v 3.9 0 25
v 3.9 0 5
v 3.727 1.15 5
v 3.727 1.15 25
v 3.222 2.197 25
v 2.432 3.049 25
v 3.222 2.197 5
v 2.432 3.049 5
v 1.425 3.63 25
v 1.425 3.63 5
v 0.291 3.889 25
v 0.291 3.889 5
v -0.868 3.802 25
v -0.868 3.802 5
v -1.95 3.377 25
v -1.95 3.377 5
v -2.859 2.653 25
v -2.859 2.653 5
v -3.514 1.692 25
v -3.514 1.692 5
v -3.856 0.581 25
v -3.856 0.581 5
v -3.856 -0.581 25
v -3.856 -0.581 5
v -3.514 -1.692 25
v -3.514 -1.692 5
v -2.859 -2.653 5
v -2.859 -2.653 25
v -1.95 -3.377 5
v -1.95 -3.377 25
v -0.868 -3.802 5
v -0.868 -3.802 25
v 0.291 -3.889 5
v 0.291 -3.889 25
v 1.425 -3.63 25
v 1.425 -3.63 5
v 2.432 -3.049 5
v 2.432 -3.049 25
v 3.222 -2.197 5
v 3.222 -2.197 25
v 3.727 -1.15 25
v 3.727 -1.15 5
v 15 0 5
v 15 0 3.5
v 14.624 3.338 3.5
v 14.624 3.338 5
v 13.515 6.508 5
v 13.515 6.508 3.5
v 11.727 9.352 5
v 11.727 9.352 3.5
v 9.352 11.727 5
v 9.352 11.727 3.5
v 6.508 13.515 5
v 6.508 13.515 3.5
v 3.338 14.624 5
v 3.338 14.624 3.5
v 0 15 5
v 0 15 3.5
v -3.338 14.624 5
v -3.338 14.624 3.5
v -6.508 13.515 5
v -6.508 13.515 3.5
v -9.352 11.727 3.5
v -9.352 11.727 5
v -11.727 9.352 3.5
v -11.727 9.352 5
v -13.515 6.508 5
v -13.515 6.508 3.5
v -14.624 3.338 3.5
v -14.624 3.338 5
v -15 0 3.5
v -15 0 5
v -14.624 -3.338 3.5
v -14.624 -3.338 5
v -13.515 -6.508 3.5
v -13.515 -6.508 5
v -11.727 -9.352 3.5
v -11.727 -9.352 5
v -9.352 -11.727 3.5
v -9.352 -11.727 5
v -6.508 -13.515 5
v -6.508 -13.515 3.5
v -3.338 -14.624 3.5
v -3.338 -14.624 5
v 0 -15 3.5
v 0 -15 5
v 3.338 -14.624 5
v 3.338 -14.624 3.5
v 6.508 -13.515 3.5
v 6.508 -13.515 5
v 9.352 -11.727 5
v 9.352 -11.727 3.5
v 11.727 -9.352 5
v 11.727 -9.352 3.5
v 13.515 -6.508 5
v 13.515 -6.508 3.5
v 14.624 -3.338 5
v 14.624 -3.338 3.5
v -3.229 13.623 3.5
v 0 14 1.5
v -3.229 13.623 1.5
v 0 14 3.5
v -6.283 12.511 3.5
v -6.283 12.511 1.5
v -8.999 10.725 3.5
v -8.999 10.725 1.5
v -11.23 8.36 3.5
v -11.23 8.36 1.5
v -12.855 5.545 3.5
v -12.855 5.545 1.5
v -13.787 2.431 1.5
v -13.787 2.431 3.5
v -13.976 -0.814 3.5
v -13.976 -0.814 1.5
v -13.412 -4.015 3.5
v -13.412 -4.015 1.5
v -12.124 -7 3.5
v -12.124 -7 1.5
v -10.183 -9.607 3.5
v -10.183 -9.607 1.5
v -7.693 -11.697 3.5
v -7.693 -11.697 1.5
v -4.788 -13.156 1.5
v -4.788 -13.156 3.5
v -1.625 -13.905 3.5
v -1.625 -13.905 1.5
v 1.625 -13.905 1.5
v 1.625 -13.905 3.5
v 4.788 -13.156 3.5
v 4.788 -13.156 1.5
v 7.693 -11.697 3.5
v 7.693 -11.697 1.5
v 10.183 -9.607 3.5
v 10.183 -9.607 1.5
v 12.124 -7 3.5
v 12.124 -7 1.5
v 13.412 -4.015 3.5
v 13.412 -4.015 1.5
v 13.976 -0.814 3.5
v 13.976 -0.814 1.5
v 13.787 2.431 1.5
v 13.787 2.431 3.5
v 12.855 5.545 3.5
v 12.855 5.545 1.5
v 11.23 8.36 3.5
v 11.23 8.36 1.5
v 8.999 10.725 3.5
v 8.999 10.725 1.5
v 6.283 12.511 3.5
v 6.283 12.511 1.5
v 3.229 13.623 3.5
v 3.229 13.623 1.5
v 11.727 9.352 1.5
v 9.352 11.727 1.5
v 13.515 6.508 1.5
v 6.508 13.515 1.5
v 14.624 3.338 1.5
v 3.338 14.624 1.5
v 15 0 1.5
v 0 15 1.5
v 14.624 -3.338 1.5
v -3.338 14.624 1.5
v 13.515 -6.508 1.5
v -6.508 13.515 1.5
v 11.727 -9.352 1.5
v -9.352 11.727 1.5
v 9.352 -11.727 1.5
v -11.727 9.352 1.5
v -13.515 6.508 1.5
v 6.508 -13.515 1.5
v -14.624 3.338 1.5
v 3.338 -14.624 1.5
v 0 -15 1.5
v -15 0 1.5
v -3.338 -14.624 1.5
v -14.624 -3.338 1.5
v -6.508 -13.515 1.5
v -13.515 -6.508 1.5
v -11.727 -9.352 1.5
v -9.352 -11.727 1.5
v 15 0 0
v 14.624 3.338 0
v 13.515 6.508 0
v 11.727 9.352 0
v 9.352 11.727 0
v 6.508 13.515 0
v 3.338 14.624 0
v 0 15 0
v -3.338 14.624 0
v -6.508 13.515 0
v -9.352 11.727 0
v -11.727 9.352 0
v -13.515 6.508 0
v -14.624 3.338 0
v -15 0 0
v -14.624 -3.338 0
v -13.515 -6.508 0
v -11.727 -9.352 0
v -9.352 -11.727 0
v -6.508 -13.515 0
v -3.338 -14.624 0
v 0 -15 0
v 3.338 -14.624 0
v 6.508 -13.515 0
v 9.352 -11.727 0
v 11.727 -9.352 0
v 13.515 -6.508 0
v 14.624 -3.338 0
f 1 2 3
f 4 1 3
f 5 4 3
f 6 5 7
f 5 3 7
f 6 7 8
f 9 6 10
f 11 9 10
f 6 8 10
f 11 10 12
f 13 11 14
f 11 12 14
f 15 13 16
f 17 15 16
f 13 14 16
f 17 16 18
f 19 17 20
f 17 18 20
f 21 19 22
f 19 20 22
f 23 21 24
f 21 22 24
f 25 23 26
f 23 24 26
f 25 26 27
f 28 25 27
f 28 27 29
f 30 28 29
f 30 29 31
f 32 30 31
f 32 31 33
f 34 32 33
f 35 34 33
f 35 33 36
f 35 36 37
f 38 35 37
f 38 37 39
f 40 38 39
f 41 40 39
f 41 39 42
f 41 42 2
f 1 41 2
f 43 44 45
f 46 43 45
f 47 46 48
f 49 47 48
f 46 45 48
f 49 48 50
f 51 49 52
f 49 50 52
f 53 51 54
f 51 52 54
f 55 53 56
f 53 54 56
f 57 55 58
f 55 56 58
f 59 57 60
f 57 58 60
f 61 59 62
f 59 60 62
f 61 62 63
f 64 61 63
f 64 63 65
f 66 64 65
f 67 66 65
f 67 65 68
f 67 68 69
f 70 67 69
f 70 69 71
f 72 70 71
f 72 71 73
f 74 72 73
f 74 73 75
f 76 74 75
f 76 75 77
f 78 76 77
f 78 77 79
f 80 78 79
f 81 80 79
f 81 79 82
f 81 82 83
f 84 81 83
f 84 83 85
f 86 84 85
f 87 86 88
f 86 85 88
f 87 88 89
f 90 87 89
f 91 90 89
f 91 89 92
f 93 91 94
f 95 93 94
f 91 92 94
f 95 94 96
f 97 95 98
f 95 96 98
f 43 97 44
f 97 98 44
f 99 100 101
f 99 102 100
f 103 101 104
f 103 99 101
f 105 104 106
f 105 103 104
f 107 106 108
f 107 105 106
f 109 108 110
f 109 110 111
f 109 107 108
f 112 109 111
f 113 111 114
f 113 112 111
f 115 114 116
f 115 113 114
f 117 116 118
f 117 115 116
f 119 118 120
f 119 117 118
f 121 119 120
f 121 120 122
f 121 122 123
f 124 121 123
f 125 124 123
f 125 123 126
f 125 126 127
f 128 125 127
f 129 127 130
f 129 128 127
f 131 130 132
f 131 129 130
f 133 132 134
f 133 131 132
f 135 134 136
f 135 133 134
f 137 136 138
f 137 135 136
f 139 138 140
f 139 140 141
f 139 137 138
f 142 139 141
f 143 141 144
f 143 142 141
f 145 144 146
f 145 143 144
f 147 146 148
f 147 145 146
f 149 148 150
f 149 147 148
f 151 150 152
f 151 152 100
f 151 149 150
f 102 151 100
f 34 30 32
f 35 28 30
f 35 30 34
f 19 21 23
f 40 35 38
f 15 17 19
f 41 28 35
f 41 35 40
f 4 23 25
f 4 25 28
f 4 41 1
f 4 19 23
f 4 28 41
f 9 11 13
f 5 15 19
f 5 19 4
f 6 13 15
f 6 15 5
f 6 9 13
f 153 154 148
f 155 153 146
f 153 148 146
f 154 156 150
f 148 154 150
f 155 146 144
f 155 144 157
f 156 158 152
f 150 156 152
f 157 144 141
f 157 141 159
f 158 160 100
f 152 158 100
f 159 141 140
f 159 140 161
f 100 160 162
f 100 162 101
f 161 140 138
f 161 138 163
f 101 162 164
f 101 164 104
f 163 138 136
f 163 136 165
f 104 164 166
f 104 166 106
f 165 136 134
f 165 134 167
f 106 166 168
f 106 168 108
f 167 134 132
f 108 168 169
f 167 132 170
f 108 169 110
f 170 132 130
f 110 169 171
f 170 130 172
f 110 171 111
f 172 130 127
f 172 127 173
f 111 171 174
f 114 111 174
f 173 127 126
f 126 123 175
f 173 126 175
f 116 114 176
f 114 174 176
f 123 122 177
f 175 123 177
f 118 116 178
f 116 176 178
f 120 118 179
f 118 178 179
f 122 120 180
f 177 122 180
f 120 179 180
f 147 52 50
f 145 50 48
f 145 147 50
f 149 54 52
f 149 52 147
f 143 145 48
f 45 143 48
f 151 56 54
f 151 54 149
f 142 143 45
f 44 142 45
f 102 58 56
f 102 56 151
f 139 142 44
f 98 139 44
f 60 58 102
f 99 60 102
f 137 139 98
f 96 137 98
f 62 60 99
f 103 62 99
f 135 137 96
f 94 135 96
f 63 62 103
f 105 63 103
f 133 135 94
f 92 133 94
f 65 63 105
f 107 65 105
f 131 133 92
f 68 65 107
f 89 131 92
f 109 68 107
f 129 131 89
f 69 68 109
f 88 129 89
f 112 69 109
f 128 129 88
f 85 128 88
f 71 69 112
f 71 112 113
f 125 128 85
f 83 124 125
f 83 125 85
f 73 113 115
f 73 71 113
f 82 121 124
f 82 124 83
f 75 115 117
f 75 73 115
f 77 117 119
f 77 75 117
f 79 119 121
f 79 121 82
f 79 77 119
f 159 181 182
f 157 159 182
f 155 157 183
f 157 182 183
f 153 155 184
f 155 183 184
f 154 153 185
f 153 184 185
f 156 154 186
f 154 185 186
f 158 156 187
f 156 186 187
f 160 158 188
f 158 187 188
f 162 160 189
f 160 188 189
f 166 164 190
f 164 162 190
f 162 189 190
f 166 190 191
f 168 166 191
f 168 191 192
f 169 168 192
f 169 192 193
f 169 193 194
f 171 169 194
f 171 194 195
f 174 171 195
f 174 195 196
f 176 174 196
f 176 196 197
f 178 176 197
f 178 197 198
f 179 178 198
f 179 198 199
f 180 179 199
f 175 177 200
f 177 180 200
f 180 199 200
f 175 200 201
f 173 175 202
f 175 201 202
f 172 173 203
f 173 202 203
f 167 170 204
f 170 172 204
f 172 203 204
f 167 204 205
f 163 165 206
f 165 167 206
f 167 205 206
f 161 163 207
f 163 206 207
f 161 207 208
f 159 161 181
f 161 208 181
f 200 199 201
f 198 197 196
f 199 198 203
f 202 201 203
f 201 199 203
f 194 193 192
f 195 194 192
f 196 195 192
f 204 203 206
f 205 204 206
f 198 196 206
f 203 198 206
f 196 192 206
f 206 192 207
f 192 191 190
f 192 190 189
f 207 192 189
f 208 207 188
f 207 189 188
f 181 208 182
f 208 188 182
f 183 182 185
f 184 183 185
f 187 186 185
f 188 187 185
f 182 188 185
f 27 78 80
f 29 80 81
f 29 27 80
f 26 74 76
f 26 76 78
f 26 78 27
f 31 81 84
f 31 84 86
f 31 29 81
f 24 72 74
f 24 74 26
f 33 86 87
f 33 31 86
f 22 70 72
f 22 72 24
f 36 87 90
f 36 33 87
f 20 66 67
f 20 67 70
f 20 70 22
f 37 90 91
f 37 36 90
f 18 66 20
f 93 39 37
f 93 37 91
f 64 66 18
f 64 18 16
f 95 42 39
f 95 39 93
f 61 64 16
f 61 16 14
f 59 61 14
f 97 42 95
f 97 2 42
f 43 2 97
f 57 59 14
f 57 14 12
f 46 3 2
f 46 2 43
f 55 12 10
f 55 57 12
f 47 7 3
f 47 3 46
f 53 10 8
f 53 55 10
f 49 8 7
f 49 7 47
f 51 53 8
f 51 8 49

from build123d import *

# Parameters (mm, degrees)
F0_R     = 3.9
F1_DEPTH = 25
F0_R_2   = 15
F2_DEPTH = 5
F3_W     = 2
F3_H     = 2


with BuildPart() as f1:
    # F0 (on Top) → F1 (new body)
    with BuildSketch(Plane.XY):
        Circle(F0_R)
    extrude(amount=F1_DEPTH)

    # F0 (on Top) → F2 (join)
    with BuildSketch(Plane.XY):
        Circle(F0_R_2)
        Circle(F0_R, mode=Mode.SUBTRACT)
    extrude(amount=F2_DEPTH)

    # F3 (on Right) → F4 (revolve, cut)
    with BuildSketch(Plane.YZ):
        with Locations((15, 2.5)):
            Rectangle(F3_W, F3_H)
    revolve(axis=Axis((0, 0, 5), (0, 0, 1)), mode=Mode.SUBTRACT)


solid = f1.part
